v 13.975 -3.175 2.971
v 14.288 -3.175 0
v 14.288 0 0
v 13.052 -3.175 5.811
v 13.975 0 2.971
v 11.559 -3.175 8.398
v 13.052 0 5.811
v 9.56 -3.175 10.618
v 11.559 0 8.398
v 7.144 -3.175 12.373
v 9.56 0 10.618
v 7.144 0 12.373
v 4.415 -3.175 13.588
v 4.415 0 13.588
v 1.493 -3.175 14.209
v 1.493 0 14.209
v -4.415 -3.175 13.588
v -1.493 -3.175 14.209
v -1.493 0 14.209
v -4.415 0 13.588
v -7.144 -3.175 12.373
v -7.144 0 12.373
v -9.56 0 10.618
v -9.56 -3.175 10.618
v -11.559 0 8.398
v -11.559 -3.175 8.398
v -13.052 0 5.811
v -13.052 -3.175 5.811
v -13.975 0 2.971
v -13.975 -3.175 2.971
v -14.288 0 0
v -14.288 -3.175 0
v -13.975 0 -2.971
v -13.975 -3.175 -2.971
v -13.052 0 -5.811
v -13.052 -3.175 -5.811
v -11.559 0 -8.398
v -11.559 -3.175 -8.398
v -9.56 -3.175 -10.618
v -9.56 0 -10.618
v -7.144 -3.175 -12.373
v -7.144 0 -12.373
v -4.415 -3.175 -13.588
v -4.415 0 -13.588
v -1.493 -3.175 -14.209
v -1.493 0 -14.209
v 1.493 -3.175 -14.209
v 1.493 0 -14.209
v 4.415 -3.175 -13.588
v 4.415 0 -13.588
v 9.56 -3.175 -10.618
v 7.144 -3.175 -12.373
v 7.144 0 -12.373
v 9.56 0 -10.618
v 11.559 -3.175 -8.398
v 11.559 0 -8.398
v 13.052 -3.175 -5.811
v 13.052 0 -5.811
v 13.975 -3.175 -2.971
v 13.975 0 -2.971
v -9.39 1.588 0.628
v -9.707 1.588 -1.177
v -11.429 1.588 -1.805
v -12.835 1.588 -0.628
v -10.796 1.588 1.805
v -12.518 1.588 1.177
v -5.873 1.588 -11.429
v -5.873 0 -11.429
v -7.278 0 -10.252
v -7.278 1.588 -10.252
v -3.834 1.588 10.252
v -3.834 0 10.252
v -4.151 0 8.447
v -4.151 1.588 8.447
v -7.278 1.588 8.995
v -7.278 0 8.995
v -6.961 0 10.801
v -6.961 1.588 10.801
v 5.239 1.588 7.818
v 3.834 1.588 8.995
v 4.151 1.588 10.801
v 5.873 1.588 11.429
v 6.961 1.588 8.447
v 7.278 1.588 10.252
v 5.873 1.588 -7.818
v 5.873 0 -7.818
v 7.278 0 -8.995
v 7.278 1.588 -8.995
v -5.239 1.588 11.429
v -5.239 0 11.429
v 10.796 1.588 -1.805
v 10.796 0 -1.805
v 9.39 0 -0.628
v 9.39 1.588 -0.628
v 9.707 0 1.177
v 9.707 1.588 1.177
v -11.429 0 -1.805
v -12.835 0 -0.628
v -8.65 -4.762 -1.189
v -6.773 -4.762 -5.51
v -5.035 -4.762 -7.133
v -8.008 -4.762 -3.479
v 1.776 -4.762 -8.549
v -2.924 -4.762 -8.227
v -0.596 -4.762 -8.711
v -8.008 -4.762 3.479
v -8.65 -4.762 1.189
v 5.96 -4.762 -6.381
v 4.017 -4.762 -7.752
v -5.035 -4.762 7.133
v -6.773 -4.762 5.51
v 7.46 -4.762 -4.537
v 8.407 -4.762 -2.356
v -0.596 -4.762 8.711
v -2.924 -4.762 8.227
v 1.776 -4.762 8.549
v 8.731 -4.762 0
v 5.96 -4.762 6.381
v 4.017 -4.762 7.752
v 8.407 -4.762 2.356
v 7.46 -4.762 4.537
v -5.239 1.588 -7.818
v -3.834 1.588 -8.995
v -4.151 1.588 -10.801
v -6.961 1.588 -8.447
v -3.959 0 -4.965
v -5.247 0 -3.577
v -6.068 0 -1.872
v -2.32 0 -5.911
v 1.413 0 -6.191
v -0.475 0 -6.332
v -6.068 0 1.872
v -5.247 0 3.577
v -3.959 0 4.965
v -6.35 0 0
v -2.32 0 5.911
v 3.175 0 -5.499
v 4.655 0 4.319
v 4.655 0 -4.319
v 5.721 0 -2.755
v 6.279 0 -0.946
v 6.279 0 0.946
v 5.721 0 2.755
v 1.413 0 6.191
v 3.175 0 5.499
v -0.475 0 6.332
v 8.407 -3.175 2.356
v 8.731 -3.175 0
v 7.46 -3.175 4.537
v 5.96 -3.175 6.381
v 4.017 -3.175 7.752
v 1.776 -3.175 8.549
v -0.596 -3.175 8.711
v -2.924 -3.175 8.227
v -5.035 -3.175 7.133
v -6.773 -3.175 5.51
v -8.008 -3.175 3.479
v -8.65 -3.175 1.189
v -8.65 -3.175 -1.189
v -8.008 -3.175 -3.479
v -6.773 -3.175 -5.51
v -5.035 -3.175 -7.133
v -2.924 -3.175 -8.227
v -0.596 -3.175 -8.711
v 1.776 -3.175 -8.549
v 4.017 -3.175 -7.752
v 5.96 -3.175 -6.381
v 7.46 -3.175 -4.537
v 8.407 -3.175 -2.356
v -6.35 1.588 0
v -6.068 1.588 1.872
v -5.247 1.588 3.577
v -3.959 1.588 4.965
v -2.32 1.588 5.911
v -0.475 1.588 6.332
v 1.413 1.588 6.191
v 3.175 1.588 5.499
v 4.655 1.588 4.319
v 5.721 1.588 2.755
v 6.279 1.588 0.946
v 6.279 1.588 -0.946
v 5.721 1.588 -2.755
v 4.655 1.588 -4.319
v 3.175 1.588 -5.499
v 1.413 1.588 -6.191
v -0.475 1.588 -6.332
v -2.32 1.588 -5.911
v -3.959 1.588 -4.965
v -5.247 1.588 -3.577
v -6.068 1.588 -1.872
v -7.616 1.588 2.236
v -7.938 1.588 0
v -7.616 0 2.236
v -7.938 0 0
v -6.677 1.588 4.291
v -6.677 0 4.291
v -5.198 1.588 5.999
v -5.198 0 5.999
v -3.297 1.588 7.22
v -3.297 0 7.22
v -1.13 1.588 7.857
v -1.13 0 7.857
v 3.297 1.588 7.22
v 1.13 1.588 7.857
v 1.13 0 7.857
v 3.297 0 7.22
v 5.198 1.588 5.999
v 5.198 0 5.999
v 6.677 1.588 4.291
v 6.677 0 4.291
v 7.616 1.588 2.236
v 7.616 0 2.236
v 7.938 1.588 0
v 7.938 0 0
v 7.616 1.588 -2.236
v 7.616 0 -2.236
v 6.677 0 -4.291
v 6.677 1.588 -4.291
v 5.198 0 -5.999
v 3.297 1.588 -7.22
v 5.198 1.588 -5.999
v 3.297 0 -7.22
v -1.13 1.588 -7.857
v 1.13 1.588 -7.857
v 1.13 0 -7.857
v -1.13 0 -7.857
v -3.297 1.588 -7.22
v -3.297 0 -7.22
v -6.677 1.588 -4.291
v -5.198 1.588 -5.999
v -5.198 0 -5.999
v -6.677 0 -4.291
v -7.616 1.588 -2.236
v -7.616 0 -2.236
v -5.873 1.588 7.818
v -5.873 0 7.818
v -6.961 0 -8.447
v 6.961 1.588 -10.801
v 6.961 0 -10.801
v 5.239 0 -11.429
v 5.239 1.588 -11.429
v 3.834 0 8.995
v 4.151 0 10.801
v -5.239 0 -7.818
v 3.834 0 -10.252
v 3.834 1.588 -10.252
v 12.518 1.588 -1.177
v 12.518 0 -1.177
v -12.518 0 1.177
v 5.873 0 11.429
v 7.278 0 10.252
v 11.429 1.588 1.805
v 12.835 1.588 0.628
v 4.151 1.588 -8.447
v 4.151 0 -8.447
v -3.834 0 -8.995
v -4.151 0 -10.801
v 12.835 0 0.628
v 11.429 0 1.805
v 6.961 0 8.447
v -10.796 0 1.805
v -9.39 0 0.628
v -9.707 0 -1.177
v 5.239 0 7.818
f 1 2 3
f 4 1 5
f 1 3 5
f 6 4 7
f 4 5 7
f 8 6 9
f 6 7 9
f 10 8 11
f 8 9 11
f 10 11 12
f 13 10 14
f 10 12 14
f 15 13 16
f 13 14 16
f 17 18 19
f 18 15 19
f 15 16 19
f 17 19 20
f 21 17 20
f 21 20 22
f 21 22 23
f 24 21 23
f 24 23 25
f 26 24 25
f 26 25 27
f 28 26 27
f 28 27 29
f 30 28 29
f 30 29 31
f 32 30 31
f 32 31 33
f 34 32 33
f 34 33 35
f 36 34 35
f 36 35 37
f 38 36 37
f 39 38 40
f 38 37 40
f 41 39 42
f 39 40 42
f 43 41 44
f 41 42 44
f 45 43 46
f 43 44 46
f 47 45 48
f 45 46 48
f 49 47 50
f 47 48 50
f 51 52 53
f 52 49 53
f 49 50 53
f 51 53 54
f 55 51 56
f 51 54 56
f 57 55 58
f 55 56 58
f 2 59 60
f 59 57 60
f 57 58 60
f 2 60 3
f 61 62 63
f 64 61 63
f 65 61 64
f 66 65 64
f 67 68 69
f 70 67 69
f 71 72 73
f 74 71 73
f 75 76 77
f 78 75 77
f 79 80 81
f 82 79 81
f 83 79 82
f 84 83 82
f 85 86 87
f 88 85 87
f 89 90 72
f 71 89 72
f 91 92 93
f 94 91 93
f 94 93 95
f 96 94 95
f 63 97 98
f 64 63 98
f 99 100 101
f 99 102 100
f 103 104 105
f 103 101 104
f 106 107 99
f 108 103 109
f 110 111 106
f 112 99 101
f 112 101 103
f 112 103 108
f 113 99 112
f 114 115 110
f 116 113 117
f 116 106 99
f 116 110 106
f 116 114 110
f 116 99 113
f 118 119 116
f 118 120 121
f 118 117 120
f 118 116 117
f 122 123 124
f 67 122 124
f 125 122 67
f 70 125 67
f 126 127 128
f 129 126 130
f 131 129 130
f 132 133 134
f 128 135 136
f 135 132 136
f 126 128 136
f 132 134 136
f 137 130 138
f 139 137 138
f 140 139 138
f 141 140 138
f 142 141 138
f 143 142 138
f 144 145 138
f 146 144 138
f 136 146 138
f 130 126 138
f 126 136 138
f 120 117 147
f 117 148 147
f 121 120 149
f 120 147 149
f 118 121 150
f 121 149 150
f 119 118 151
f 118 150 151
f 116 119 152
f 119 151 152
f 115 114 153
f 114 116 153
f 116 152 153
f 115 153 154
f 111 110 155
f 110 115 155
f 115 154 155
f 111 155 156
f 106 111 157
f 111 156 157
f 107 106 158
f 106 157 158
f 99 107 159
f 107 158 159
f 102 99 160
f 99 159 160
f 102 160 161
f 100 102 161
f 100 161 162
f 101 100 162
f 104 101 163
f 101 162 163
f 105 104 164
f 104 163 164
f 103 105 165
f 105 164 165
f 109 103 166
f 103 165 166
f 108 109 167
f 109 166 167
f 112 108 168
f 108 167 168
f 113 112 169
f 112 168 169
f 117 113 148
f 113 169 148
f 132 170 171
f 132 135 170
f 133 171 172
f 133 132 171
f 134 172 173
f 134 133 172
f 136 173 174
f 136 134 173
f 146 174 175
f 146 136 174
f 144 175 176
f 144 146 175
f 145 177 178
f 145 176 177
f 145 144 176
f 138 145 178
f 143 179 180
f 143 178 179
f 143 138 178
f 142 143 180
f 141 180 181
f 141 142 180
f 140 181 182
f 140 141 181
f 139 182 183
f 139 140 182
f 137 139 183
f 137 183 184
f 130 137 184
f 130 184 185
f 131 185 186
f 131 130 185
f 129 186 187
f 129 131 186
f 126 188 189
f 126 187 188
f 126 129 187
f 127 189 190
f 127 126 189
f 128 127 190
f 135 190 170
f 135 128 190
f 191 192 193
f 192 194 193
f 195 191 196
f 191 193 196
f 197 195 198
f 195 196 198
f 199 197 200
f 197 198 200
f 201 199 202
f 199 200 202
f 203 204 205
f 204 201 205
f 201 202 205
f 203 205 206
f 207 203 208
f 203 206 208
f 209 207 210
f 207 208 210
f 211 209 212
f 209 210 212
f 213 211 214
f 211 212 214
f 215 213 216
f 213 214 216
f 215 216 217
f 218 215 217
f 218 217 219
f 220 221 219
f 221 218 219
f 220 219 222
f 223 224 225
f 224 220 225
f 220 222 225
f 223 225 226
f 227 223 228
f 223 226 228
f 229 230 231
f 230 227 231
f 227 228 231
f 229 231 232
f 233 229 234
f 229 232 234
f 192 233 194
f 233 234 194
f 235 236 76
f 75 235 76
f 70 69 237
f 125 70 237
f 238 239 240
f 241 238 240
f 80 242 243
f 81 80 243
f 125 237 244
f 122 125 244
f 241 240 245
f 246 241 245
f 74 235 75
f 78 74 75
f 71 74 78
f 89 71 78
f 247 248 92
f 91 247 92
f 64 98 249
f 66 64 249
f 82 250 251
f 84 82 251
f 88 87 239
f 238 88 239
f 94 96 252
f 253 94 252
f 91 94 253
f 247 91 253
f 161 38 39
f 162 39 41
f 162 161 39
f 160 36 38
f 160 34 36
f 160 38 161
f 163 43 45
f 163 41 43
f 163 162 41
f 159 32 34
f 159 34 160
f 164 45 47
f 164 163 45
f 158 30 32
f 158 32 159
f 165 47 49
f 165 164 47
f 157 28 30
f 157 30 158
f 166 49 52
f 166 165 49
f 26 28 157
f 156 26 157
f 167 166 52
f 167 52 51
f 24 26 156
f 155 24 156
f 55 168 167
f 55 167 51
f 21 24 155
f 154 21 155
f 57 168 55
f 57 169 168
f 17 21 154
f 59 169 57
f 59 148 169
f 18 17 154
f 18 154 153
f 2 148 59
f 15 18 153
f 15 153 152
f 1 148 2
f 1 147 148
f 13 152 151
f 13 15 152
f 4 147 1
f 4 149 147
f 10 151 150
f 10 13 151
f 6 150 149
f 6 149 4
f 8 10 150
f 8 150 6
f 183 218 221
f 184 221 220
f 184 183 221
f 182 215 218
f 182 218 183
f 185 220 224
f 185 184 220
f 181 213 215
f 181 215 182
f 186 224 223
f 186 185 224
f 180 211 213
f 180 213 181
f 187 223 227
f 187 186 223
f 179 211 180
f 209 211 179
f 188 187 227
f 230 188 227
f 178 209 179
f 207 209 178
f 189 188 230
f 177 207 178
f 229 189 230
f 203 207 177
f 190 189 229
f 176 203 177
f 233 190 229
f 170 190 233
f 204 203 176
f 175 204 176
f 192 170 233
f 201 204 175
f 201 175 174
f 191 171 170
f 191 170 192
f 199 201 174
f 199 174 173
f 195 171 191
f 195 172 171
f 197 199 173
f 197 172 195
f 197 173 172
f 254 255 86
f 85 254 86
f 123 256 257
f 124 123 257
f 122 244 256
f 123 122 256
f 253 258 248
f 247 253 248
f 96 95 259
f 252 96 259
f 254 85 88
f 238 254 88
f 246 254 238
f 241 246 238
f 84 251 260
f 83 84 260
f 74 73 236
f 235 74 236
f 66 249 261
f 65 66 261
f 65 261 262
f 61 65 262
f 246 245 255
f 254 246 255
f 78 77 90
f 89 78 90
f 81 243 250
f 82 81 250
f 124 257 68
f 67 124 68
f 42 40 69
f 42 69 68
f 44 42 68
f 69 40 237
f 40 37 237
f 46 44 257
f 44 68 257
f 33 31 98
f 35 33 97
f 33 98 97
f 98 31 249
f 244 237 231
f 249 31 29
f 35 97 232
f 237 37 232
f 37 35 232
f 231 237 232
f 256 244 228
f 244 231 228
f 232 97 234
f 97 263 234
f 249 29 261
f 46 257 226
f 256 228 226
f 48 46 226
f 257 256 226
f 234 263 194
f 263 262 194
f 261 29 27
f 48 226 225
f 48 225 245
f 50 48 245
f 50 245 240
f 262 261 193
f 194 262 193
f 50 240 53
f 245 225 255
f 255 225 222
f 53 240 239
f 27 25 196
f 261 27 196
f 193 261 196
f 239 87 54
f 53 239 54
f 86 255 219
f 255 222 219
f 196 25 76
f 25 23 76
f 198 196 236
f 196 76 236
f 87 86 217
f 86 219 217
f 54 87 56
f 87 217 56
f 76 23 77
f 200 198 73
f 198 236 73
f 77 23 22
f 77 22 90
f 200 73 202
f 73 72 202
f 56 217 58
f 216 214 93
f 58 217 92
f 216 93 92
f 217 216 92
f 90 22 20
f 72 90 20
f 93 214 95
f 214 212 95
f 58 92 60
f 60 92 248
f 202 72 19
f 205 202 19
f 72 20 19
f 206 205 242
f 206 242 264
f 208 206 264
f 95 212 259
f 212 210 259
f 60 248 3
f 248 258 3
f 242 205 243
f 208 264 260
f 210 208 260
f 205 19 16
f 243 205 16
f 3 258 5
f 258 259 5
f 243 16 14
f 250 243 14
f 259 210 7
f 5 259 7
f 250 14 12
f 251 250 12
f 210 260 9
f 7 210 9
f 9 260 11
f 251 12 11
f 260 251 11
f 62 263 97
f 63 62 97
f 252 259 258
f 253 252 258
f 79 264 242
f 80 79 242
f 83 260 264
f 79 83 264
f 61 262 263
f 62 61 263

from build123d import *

# Parameters (mm, degrees)
F0_R     = 14.2875
F1_DEPTH = 3.175
F2_R     = 8.73125
F3_DEPTH = 1.5875
F5_DEPTH = 1.5875
F6_R     = 7.9375
F6_R_2   = 6.35
F7_DEPTH = 1.5875
F8_COUNT = 6


with BuildPart() as f1:
    # F0 (on Front) → F1 (new body)
    with BuildSketch(Plane.XZ):
        Circle(F0_R)
    extrude(amount=F1_DEPTH)

    # F2 (on face) → F3 (join)
    with BuildSketch(Plane.XZ.offset(3.175)):
        Circle(F2_R)
    extrude(amount=F3_DEPTH)

    # F4 (on face) → F5 (join)
    with BuildSketch(Plane(origin=(0, 0, 0), x_dir=(-1, 0, 0), z_dir=(0, 1, 0))):
        Polygon((11.4293787458, -1.8054905687), (12.8345400717, -0.6283202405), (12.5176613259, 1.1771703282), (10.7956212542, 1.8054905687), (9.3904599283, 0.6283202405), (9.7073386741, -1.1771703282), align=None)
    extrude(amount=F5_DEPTH)

    # F6 (on face) → F7 (join)
    with BuildSketch(Plane(origin=(0, 0, 0), x_dir=(-1, 0, 0), z_dir=(0, 1, 0))):
        Circle(F6_R)
        Circle(F6_R_2, mode=Mode.SUBTRACT)
    extrude(amount=F7_DEPTH)

    # F8: F1 ×6 about axis
    f8_axis = Axis((0, 1.5875, 0), (0, 1, 0))


with BuildPart() as f1_1:
    add(f1.part)
    for i in range(1, F8_COUNT):
        add(f1.part.rotate(f8_axis, i * 360 / F8_COUNT))


solid = f1_1.part
